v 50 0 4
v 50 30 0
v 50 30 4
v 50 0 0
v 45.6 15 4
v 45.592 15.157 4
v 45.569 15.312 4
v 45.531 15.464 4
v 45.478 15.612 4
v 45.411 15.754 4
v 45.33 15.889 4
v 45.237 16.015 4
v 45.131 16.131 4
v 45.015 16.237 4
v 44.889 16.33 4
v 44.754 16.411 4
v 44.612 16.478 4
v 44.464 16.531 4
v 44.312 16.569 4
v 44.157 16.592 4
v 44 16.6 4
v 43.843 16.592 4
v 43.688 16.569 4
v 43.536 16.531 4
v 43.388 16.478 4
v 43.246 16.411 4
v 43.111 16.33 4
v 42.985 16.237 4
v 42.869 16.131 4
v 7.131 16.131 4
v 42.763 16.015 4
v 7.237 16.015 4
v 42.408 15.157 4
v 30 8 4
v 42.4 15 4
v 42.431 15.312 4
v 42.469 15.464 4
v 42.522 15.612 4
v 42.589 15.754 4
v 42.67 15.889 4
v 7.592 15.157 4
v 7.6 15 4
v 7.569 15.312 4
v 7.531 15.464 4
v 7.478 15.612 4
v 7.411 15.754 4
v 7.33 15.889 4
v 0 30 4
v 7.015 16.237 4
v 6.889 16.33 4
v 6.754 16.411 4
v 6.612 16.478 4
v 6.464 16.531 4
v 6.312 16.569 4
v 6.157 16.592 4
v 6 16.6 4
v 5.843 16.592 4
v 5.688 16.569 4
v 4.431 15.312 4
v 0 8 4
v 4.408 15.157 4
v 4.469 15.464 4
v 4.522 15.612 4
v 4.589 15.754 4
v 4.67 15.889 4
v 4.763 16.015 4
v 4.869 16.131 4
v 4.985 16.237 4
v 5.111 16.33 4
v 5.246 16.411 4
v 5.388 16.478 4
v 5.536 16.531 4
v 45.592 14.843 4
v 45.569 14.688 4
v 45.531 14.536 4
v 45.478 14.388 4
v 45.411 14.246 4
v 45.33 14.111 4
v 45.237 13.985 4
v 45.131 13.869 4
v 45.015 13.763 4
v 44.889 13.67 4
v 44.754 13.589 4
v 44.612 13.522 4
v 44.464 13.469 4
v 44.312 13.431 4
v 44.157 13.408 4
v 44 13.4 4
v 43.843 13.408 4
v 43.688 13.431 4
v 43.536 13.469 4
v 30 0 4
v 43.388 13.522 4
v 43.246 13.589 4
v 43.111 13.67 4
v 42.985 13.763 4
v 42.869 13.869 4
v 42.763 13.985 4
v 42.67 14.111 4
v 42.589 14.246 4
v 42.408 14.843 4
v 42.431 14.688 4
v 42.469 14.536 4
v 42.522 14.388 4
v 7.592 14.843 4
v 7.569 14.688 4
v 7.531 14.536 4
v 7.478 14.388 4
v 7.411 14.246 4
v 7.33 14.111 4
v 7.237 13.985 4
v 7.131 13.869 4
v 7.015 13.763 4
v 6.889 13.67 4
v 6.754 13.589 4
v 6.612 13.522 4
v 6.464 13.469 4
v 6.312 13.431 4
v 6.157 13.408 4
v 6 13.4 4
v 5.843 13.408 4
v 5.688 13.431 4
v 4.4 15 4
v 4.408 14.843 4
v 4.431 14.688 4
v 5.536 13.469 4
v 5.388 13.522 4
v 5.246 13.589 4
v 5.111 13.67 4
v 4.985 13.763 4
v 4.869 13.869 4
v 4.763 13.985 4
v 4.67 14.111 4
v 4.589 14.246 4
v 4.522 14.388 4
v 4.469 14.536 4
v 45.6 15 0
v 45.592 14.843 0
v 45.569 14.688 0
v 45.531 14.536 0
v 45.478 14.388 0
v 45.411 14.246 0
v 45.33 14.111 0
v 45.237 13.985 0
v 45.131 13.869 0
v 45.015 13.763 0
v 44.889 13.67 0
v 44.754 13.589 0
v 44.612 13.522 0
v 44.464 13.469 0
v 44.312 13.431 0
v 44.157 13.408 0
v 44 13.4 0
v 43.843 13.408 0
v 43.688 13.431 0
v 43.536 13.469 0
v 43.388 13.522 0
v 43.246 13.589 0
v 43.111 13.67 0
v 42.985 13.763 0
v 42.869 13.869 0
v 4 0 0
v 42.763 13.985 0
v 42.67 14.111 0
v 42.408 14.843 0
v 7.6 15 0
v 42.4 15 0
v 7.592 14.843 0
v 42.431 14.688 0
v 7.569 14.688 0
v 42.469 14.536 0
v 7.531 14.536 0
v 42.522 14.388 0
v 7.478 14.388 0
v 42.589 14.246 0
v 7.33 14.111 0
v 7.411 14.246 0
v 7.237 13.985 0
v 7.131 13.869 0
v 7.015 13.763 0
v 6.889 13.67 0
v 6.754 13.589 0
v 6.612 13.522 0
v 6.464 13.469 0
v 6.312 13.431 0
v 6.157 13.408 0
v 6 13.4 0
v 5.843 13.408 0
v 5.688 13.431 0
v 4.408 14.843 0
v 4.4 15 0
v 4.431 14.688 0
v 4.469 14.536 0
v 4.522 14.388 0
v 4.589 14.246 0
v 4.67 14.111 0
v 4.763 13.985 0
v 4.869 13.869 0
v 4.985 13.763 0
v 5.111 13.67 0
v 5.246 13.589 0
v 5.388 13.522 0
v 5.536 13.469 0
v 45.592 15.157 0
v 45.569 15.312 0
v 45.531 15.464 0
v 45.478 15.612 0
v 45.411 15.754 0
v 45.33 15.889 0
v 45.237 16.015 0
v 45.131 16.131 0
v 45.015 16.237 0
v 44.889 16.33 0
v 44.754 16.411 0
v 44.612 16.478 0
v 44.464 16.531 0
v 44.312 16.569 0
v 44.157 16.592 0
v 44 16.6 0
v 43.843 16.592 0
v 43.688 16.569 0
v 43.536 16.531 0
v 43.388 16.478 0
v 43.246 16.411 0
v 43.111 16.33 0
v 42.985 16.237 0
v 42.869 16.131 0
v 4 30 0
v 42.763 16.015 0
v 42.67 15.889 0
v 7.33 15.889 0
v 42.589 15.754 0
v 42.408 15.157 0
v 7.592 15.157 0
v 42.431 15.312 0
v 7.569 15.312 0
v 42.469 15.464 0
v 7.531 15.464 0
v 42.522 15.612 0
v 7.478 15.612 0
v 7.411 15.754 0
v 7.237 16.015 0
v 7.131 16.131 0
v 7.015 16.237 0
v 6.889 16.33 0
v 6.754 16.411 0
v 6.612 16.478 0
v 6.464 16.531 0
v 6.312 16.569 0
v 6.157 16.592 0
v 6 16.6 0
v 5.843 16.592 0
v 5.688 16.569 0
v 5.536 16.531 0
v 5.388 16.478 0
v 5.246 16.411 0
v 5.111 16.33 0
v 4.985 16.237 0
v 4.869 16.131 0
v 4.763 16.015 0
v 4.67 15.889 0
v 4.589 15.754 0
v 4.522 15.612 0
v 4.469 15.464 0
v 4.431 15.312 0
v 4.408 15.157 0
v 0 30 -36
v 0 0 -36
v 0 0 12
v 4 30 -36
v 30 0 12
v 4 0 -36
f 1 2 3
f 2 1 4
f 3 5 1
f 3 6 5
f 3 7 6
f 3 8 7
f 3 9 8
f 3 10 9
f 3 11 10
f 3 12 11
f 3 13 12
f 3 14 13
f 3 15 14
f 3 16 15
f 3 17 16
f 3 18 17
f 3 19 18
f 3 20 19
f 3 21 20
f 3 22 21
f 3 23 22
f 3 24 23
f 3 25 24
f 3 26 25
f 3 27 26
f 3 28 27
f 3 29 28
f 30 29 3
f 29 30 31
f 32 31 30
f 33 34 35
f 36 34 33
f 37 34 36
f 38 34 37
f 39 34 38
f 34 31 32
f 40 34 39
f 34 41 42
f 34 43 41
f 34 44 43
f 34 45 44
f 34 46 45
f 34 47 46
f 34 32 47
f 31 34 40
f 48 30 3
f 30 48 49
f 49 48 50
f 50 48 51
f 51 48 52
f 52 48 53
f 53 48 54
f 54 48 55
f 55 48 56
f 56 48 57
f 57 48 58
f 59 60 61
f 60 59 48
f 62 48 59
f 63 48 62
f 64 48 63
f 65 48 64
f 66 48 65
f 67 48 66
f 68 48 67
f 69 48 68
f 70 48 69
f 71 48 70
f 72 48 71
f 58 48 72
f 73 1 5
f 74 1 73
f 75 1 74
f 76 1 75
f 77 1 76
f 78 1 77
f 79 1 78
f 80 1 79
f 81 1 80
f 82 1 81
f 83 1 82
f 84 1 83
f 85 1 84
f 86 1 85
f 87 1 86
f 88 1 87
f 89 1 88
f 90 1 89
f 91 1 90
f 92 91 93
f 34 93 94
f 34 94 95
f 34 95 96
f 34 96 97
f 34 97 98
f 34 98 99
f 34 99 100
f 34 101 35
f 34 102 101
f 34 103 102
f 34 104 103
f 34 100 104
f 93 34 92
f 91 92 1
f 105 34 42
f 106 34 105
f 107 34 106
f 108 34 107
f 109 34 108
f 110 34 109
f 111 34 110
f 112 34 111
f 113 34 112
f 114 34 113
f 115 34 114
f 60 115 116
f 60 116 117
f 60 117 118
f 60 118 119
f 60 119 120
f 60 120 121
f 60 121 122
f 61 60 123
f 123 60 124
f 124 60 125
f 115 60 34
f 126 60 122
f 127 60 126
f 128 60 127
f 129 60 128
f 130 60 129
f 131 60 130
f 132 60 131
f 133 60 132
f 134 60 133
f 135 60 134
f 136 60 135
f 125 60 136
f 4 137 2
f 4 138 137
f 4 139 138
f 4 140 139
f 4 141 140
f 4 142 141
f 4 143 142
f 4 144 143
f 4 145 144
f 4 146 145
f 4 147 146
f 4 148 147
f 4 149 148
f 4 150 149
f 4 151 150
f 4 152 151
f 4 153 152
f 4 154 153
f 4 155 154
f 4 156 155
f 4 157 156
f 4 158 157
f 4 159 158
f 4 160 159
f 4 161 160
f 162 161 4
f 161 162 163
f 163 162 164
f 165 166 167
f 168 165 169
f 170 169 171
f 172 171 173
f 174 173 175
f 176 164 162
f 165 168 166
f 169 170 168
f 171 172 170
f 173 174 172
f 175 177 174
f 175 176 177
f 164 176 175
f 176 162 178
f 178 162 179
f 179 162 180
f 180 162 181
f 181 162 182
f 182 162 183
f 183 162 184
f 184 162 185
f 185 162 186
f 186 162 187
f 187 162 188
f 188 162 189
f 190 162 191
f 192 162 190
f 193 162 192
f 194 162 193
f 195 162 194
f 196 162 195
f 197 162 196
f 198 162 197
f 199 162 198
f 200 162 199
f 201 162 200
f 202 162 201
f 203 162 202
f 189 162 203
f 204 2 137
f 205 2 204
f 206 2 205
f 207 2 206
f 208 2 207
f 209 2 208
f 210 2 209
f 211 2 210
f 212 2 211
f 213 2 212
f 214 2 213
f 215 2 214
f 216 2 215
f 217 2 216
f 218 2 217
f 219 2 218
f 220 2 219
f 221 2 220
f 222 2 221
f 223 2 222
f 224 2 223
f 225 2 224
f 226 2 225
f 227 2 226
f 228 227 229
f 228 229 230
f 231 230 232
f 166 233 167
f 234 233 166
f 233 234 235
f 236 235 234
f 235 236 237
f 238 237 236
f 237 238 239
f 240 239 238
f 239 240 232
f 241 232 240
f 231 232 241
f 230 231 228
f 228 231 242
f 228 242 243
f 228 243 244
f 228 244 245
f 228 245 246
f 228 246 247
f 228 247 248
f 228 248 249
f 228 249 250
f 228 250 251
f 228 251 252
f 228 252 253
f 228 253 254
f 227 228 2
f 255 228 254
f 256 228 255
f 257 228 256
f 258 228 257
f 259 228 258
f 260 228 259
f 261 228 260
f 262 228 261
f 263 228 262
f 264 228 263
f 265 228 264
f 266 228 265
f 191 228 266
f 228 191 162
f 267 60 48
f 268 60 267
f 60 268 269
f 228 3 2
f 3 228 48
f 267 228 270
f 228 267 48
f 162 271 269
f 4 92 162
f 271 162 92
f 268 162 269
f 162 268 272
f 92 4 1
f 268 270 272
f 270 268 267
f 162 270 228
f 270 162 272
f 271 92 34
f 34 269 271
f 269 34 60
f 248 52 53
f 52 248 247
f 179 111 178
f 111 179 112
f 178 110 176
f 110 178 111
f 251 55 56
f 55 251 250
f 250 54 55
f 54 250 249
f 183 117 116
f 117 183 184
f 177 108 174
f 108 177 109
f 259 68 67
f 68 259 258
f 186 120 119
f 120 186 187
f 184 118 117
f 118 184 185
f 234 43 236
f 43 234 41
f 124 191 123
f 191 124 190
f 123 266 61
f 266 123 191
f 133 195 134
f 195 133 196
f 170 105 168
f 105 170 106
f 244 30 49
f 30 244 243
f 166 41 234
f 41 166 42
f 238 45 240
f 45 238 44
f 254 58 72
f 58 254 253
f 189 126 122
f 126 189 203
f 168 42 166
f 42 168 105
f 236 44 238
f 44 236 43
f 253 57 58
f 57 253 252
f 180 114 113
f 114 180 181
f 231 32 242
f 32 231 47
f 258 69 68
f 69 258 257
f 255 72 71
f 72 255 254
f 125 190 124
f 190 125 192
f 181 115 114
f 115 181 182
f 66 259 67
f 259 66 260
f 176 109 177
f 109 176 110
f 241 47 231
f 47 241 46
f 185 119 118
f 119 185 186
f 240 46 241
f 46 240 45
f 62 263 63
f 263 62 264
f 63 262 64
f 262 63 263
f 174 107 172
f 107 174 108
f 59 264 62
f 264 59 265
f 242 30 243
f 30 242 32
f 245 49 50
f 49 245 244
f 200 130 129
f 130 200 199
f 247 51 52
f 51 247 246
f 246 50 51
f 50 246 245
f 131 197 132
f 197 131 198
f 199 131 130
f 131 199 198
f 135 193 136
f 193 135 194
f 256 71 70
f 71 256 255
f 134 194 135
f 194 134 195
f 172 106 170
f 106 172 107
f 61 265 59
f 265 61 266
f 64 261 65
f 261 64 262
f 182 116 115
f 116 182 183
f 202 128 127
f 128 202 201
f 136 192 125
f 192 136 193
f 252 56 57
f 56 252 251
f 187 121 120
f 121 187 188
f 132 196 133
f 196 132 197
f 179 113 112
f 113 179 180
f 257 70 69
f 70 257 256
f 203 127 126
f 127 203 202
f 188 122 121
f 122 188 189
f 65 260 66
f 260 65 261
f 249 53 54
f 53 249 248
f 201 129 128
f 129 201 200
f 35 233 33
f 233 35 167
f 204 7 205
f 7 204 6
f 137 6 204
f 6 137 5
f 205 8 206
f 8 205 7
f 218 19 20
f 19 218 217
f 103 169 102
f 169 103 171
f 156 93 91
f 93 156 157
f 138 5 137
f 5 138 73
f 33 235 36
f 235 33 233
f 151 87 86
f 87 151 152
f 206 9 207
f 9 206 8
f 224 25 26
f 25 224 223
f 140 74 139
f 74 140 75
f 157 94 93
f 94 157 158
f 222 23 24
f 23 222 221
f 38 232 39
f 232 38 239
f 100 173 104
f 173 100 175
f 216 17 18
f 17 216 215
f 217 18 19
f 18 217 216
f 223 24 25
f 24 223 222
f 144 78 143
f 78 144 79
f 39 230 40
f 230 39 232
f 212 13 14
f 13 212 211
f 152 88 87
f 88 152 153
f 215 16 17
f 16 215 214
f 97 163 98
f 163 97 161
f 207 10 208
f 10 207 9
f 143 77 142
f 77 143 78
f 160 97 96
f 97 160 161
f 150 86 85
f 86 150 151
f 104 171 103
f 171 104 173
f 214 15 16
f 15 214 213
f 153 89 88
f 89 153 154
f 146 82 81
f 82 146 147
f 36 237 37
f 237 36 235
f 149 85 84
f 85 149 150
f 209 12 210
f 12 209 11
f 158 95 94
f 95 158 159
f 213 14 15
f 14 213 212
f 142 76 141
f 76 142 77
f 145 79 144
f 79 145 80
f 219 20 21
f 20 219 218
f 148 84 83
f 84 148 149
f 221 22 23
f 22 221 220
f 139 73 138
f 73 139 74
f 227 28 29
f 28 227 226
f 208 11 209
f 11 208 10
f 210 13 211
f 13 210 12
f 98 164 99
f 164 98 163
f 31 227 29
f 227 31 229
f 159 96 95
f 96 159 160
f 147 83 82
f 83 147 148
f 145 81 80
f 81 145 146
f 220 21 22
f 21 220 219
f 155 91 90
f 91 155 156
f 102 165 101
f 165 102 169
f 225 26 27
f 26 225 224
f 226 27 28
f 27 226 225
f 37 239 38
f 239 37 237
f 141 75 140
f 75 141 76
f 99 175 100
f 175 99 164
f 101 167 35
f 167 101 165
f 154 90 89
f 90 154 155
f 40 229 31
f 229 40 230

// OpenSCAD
// simple-bracket.scad
// 入门级示例: L 型支架 + 孔位
// 演示 rotate() + translate() + difference() 组合

/* [Dimensions] */
leg1_l = 50;           // 水平腿长 (mm)
leg2_l = 40;           // 垂直腿长 (mm)
width   = 30;          // 支架宽度 (mm)
thickness = 4;         // 壁厚 (mm)
corner_r = 4;          // 外角半径 (mm)

/* [Holes] */
hole_d = 3.2;          // 孔直径 (mm) — M3 标准
hole_count = 2;        // 每条腿上的孔数
hole_margin = 6;       // 孔到边缘/弯折线的距离 (mm)

/* [Quality] */
$fn = 64;


module L_bracket() {
    // L 型主体: 用两个 cube + 圆角过渡
    union() {
        // 水平腿 (沿 X 轴)
        cube([leg1_l, width, thickness]);

        // 垂直腿 (沿 Y 面，向上延伸)
        translate([0, 0, thickness])
            rotate([0, 90, 0])
                cube([leg2_l, width, thickness]);

        // 弯折处加强: 三棱柱简化三角支撑
        translate([0, 0, thickness])
            rotate([0, 90, 0])
                rotate([0, 0, 90])
                    linear_extrude(width)
                        polygon(points = [
                            [0, 0],
                            [thickness * 2, 0],
                            [0, thickness * 2]
                        ]);
    }
}

module mounting_holes() {
    // 水平腿上的孔
    spacing_1 = (leg1_l - 2 * hole_margin) / (hole_count - 1);
    for (i = [0 : hole_count - 1])
        translate([hole_margin + i * spacing_1, width / 2, -1])
            cylinder(h = thickness + 2, d = hole_d);

    // 垂直腿上的孔
    spacing_2 = (leg2_l - 2 * hole_margin) / (hole_count - 1);
    for (i = [0 : hole_count - 1])
        translate([thickness, width / 2,
                   thickness + hole_margin + i * spacing_2])
            rotate([0, 90, 0])
                cylinder(h = thickness + 2, d = hole_d);
}

module main() {
    difference() {
        L_bracket();
        mounting_holes();
    }
}

main();

// 导出示例:
// openscad simple-bracket.scad -D "leg1_l=60" -D "leg2_l=50" -o bracket.stl
